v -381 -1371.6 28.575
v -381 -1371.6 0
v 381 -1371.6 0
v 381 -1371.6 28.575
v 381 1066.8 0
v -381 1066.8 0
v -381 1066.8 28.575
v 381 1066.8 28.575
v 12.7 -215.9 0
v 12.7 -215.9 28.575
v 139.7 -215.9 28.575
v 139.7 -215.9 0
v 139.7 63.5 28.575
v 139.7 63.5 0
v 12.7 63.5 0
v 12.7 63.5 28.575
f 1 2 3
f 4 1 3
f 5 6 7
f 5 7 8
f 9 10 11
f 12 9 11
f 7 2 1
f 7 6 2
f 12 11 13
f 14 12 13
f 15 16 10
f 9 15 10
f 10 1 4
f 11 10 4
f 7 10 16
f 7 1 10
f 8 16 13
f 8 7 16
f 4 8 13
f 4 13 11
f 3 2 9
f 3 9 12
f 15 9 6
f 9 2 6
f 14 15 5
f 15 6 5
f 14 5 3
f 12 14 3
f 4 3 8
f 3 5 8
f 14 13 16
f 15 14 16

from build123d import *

# Parameters (mm, degrees)
F0_W     = 762
F0_H     = 2133.6
F1_DEPTH = 28.575
F3_DEPTH = 31.75
F4_DEPTH = 304.8


with BuildPart() as f1:
    # F0 (on Top) → F1 (new body)
    with BuildSketch(Plane.XY):
        Rectangle(F0_W, F0_H)
    extrude(amount=F1_DEPTH)

    # F2 (on face) → F3 (cut)
    with BuildSketch(Plane.XY.offset(28.575)):
        Polygon((12.7, 63.5), (12.7, -76.2), (12.7, -215.9), (139.7, -215.9), (139.7, 63.5), align=None)
    extrude(amount=-F3_DEPTH, mode=Mode.SUBTRACT)

    # F4 (add): a face of the model
    f4_faces = [f1.faces().sort_by_distance(p)[0] for p in [
        (0, -1066.8, 14.2875),
    ]]
    extrude(f4_faces, amount=F4_DEPTH)


solid = f1.part
